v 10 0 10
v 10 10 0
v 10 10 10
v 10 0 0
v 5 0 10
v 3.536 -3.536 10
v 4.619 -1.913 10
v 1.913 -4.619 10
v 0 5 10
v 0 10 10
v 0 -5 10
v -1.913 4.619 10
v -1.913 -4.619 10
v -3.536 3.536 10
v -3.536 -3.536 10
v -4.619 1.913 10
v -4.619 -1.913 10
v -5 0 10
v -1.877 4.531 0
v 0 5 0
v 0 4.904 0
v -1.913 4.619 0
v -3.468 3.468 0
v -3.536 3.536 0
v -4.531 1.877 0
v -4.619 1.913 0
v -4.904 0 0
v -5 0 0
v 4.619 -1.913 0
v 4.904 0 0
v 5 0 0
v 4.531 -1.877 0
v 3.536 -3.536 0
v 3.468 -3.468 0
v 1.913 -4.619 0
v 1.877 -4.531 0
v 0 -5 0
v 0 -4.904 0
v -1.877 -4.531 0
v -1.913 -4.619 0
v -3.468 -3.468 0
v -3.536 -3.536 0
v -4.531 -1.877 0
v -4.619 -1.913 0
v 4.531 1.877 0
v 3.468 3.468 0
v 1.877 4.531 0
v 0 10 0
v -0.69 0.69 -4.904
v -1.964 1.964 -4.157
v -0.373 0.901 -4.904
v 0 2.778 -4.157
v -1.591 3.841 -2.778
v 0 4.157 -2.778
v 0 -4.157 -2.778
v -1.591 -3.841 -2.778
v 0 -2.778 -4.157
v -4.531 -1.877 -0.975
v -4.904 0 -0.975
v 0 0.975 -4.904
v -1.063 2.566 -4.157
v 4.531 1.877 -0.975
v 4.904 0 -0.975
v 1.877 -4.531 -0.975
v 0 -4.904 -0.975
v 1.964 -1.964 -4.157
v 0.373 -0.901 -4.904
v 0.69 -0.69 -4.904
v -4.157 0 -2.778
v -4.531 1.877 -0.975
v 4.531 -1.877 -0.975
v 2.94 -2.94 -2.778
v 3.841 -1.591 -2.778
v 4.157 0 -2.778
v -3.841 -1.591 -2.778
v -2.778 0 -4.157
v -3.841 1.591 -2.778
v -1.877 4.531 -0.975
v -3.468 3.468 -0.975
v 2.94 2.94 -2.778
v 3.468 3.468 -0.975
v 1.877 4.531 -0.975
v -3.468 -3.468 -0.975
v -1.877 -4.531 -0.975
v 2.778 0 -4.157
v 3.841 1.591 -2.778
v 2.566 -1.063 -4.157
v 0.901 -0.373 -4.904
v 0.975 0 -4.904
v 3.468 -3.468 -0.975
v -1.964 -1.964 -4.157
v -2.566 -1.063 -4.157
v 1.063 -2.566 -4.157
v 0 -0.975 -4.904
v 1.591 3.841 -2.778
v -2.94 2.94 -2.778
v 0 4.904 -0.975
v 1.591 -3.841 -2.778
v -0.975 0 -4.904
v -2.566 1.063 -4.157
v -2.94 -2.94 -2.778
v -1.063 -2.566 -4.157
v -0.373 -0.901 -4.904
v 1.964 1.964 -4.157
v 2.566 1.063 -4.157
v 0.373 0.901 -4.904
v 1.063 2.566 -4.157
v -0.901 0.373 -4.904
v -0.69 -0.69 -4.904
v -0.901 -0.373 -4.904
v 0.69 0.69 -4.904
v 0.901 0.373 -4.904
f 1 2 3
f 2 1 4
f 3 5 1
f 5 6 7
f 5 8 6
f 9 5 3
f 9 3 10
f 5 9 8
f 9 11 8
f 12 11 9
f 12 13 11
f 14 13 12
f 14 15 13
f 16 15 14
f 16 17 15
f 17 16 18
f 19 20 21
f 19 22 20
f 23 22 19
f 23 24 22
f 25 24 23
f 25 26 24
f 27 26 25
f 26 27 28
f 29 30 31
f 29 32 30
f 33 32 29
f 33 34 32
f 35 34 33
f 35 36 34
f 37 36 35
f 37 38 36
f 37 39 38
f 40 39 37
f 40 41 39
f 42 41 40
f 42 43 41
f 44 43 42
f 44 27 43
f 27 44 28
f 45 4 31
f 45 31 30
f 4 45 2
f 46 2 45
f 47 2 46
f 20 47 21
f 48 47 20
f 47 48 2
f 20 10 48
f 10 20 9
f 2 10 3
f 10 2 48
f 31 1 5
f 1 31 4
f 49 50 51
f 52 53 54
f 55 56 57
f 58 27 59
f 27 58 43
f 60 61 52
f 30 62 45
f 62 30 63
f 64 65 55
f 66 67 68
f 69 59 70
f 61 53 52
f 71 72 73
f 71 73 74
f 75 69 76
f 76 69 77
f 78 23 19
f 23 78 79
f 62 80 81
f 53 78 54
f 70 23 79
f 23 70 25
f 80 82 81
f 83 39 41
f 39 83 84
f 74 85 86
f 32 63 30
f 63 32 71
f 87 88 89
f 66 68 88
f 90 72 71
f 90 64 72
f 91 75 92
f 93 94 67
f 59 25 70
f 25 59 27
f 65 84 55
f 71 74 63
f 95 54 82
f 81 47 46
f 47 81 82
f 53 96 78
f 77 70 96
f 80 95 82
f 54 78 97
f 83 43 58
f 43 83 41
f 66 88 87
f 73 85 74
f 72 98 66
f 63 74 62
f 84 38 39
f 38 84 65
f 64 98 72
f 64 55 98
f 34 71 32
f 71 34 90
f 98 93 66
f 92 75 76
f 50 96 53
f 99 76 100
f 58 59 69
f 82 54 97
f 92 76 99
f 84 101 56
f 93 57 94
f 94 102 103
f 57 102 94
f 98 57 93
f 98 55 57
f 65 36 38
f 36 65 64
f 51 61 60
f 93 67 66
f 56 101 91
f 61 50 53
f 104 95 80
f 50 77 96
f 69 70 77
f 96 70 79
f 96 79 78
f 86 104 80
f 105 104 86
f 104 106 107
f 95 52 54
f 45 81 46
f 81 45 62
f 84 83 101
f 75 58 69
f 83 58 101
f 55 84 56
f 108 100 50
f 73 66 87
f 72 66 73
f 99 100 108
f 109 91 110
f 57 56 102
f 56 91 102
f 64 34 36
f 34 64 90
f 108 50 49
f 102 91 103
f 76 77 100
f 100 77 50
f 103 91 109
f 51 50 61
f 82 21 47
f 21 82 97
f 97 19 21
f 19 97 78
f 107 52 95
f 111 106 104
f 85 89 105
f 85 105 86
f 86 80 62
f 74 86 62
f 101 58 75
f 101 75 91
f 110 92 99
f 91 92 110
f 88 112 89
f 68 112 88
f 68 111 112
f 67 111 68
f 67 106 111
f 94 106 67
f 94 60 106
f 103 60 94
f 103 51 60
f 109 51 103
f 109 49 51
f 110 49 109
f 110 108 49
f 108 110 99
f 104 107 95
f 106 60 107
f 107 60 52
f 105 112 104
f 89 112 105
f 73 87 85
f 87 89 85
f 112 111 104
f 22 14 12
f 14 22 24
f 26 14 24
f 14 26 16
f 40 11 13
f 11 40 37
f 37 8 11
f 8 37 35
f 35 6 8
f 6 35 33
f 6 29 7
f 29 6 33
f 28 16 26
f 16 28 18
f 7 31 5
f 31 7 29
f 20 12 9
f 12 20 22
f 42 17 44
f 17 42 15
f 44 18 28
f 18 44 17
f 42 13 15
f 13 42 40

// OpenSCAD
cube(10);
// This comment should stay on its own line

sphere(5);
// Another comment

// Block comment
cylinder(h=10, r=5);
